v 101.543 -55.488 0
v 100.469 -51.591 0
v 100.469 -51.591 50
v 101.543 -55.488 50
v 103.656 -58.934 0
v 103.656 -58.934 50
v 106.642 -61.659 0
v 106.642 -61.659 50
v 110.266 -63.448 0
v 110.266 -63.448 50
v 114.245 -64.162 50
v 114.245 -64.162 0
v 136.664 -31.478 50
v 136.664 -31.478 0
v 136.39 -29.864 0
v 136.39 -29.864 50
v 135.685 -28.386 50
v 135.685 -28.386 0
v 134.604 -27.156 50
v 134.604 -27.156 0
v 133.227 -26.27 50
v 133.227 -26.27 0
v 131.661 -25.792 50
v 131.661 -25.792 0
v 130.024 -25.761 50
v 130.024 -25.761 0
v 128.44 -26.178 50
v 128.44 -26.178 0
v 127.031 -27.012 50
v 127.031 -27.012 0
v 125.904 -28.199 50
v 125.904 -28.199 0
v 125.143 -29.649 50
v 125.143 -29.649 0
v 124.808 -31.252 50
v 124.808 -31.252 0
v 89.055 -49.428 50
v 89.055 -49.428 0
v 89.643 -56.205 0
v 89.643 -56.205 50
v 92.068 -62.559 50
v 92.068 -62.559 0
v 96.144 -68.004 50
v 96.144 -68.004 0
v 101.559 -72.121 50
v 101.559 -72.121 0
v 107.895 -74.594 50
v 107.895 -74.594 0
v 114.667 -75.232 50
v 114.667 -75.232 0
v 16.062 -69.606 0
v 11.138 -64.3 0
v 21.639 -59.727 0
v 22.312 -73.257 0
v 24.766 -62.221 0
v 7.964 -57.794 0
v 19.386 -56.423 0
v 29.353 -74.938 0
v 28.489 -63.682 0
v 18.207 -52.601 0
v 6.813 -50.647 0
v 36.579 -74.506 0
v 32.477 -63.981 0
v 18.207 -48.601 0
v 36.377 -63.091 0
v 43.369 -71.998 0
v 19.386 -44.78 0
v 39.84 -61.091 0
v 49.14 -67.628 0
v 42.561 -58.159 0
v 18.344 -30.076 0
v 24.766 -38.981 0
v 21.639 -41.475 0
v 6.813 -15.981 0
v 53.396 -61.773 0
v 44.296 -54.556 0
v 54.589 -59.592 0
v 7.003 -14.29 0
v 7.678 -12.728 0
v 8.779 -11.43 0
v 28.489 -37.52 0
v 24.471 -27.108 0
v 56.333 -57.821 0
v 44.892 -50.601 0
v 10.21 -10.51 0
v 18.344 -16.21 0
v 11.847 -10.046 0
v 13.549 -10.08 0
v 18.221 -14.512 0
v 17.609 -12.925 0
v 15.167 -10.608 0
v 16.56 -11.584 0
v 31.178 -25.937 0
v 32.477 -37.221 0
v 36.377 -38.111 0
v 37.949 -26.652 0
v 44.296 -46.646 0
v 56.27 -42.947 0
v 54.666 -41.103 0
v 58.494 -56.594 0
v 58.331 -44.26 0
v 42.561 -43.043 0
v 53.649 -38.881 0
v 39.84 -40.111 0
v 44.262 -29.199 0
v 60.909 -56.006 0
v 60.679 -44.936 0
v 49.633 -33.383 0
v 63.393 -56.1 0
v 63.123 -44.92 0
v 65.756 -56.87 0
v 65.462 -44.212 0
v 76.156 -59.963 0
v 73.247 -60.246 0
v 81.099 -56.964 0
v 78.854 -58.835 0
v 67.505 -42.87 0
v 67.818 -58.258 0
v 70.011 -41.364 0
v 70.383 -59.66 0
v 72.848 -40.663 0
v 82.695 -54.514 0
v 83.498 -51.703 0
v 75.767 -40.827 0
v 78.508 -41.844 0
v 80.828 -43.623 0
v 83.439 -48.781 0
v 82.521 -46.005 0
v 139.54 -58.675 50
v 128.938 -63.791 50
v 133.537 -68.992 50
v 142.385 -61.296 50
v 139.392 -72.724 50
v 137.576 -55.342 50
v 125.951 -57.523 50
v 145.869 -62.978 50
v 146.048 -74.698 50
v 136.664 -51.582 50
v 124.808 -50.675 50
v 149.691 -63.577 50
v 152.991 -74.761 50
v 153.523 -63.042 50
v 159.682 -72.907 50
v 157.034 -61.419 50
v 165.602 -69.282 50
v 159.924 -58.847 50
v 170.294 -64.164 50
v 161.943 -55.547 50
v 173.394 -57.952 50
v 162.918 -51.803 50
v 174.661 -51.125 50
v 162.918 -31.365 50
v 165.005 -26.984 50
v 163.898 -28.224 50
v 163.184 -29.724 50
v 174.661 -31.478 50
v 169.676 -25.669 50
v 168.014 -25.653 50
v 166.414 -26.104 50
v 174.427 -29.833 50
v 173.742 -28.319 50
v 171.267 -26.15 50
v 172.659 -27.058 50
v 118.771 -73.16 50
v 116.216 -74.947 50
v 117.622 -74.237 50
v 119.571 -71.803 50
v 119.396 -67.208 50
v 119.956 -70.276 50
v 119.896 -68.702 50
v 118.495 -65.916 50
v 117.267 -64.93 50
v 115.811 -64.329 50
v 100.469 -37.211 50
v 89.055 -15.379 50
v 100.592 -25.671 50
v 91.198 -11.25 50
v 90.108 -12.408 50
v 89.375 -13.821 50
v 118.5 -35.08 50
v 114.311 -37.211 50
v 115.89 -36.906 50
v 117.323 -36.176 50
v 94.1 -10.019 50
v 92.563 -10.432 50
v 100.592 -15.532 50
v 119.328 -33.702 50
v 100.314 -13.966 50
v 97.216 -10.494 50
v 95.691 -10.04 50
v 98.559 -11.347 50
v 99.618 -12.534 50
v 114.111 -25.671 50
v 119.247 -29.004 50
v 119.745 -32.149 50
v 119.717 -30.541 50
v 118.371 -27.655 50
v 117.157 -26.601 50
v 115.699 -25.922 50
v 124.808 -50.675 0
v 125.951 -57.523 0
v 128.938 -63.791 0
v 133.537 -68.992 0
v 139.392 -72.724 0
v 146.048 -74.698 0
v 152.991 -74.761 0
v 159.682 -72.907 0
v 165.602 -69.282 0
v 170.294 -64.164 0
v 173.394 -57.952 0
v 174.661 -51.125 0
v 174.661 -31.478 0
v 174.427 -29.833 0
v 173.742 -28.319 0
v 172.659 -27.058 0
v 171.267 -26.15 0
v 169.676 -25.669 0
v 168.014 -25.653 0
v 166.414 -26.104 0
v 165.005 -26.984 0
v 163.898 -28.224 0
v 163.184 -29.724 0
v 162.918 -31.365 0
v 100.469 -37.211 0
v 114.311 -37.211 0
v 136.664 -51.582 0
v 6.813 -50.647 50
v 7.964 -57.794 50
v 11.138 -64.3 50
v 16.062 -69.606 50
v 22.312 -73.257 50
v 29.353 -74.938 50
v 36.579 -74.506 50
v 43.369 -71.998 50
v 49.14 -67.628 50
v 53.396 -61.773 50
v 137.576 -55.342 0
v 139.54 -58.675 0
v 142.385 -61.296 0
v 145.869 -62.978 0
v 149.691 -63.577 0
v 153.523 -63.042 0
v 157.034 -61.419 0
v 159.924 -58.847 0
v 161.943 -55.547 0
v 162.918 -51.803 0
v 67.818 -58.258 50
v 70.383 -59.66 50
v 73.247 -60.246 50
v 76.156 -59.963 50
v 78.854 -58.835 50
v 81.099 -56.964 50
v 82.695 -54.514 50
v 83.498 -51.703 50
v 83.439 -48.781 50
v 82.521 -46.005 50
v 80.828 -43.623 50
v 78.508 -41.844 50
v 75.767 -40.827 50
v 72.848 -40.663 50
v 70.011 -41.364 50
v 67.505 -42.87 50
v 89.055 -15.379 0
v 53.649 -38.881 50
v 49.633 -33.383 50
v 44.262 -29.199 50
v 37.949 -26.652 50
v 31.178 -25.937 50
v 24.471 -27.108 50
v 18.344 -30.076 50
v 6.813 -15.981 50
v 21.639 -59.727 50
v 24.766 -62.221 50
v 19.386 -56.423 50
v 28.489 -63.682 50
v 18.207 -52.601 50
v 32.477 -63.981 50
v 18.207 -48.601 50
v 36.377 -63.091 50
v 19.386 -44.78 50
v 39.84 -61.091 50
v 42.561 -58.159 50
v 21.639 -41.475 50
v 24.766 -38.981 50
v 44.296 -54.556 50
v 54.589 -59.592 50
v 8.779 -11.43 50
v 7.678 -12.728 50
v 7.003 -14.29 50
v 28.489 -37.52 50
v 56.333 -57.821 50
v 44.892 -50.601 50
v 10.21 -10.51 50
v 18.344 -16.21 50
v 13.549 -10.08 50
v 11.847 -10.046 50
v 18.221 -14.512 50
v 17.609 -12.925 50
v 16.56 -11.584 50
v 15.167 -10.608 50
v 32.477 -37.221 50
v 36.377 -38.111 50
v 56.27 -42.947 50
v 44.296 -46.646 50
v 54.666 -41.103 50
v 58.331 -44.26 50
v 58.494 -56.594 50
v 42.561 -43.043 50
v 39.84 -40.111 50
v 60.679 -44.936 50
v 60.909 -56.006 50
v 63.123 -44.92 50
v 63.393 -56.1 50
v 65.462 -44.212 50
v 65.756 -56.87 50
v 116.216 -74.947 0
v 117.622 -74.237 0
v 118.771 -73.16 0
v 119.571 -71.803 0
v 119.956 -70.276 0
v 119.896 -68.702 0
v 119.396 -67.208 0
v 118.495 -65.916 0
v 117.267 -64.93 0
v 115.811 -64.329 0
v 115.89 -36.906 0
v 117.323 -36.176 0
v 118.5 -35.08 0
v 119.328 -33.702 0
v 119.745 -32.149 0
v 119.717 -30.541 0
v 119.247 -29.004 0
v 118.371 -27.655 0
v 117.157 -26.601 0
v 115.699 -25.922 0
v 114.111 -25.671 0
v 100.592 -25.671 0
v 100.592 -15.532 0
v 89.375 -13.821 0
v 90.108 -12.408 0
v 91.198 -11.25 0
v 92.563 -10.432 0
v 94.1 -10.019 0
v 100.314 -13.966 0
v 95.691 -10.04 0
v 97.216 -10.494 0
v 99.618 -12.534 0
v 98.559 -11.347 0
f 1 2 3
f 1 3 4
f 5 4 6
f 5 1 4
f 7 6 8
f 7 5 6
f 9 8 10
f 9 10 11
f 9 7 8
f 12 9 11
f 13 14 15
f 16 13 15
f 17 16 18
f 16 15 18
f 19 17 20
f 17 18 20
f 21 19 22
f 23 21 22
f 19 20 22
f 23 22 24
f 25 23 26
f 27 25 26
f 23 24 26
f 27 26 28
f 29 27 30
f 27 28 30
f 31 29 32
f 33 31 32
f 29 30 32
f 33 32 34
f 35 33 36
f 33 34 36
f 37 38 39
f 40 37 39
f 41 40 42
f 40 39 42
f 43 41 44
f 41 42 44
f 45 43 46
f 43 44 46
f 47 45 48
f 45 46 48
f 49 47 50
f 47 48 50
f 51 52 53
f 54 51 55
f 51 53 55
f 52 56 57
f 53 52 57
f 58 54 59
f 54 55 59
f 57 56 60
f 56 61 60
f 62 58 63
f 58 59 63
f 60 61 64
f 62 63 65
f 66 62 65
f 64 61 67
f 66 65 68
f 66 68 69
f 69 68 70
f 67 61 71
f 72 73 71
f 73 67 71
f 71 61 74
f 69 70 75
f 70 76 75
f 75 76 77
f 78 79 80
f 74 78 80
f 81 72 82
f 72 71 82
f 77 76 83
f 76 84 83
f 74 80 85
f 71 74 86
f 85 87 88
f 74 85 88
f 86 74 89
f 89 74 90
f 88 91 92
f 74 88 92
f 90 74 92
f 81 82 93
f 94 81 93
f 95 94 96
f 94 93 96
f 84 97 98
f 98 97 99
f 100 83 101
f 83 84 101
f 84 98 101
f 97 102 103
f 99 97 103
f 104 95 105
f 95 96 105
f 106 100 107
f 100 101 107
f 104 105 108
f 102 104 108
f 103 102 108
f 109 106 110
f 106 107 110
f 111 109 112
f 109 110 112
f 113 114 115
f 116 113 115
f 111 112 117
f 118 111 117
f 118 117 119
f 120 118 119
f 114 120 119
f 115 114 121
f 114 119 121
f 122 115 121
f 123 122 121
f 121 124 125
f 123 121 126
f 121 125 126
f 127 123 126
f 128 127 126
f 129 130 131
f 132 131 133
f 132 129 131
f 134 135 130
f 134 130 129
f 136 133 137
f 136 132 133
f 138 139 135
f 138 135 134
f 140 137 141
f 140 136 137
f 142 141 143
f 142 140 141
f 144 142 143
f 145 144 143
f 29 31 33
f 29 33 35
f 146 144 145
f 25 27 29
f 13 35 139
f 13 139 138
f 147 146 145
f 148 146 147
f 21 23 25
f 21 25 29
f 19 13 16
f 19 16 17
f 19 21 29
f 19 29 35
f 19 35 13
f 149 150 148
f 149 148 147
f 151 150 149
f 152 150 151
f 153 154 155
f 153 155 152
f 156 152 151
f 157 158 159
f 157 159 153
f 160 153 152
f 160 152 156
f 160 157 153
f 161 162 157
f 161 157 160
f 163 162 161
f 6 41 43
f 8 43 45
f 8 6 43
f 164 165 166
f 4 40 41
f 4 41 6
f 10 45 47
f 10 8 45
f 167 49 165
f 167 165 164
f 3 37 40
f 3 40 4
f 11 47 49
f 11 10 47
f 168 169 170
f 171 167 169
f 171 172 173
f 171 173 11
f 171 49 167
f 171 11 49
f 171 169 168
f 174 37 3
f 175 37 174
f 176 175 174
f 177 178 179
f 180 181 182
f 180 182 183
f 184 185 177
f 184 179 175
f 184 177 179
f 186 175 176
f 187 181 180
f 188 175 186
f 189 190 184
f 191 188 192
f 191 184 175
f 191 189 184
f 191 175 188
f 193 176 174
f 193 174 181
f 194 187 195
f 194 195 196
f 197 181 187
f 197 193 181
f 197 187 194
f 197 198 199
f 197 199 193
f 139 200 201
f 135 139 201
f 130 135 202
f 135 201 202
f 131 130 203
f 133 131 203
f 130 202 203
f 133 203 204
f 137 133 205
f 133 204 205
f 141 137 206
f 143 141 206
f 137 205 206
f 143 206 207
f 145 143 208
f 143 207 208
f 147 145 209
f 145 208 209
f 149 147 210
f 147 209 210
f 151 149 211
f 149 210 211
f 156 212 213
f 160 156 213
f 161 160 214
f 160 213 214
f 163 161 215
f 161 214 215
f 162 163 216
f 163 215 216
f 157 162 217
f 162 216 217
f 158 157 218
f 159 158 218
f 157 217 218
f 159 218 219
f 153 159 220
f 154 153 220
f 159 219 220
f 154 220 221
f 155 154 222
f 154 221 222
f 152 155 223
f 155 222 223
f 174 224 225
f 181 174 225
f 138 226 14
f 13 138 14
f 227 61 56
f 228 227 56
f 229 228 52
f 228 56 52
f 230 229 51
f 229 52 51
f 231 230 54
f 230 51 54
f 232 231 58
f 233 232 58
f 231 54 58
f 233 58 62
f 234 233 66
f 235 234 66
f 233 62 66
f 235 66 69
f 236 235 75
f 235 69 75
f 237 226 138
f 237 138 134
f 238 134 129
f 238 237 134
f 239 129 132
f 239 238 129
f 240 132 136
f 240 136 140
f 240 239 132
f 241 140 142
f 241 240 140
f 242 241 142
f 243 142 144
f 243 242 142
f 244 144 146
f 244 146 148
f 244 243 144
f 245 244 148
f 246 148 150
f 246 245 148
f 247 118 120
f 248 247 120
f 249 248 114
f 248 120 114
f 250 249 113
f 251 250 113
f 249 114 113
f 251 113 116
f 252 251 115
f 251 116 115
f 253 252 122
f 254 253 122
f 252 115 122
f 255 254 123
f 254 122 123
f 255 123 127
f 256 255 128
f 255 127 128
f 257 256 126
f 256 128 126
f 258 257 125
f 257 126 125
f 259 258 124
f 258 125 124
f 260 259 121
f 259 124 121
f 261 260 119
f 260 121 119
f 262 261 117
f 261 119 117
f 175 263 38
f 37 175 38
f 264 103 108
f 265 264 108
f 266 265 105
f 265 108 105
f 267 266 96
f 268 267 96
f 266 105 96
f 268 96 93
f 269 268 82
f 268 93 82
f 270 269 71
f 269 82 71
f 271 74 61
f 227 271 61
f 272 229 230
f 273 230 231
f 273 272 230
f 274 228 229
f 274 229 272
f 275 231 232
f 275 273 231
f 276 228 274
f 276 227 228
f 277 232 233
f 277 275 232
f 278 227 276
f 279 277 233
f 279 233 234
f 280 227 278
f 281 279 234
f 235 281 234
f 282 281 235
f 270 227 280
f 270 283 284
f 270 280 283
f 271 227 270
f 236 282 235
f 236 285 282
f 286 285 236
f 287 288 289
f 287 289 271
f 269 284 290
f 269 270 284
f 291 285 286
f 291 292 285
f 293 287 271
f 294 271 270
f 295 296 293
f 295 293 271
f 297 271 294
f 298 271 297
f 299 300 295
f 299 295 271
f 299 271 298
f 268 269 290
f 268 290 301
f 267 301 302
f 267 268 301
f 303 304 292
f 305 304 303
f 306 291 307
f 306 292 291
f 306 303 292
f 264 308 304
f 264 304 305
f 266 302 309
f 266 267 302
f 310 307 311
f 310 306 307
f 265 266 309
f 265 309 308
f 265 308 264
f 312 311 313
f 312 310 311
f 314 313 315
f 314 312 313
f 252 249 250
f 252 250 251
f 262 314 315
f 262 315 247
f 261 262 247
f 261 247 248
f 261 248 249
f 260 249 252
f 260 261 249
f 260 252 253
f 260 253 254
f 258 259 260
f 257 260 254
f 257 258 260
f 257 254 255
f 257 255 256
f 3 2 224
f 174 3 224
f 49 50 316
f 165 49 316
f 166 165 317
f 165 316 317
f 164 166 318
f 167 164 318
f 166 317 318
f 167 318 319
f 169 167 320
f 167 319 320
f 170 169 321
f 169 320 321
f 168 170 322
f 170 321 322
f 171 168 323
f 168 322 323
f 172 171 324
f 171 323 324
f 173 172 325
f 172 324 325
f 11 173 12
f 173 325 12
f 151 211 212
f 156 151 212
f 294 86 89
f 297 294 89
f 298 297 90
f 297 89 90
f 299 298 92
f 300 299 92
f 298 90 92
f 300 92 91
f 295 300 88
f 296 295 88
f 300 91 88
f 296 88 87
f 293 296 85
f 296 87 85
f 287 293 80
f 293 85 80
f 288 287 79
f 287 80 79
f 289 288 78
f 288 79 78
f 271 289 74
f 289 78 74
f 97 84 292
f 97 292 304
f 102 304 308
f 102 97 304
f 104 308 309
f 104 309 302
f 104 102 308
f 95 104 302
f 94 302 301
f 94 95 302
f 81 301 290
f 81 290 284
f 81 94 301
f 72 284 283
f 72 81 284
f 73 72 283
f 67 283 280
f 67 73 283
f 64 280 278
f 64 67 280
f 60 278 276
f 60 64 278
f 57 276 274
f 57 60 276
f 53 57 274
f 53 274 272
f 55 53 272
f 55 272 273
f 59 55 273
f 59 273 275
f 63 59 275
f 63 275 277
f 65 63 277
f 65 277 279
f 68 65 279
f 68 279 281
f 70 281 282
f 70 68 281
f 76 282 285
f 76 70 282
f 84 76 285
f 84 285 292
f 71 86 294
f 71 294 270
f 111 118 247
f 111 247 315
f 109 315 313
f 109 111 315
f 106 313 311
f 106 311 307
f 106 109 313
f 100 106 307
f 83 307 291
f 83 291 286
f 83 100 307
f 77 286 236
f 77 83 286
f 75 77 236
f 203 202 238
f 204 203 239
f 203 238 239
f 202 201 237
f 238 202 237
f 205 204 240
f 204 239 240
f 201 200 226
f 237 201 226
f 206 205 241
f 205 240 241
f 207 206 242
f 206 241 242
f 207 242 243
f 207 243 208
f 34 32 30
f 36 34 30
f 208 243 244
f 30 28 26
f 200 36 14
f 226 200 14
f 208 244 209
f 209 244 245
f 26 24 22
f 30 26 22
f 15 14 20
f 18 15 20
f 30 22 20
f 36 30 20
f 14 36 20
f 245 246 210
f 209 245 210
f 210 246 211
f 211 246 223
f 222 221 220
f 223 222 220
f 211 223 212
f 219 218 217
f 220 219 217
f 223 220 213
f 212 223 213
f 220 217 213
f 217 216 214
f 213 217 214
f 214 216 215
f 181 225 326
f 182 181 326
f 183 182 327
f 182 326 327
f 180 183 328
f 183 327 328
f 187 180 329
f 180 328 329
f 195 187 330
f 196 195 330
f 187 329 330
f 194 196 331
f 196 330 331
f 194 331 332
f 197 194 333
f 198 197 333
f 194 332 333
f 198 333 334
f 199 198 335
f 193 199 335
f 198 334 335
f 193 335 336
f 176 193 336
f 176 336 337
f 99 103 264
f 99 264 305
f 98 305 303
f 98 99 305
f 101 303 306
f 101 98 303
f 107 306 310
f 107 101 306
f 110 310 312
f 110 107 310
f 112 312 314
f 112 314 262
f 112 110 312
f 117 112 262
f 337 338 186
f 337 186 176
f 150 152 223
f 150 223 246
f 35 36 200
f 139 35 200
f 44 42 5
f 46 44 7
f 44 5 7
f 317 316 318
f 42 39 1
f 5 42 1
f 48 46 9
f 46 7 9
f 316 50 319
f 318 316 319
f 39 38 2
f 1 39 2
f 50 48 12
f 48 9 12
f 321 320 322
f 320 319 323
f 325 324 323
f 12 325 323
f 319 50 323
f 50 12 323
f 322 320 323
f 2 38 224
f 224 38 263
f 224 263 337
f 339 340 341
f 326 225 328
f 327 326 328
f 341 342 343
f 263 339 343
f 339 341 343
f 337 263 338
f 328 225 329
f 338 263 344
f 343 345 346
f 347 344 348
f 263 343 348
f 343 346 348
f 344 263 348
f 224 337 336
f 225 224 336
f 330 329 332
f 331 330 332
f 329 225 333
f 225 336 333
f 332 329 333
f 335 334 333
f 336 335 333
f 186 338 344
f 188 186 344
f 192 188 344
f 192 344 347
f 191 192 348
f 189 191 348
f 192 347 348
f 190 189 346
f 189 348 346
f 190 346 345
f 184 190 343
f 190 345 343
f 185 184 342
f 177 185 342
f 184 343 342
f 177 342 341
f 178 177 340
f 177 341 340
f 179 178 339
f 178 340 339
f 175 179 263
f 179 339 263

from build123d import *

# Parameters (mm, degrees)
SKETCH003_R = 13.417184
PAD_DEPTH   = 50


with BuildPart() as part:
    # Sketch003 → Pad (new body)
    with BuildSketch(Plane.XY):
        with BuildLine():
            ThreePointArc((100.592001, -15.532155), (94.896046, -9.973995), (89.054965, -15.379439))
            Line((89.054965, -15.379439), (89.054965, -49.428334))
            ThreePointArc((89.054965, -49.428334), (96.144439, -68.004268), (114.666978, -75.232099))
            ThreePointArc((114.666978, -75.232099), (119.982403, -69.486443), (114.244811, -64.162315))
            ThreePointArc((100.468937, -51.591315), (105.053235, -60.401247), (114.244811, -64.162315))
            Line((100.468937, -51.591315), (100.468937, -37.211213))
            Line((100.468937, -37.211213), (114.311441, -37.211213))
            ThreePointArc((114.311441, -37.211213), (119.787219, -31.344318), (114.111035, -25.671088))
            Line((114.111035, -25.671088), (100.592001, -25.671088))
            Line((100.592001, -15.532155), (100.592001, -25.671088))
        make_face()
        with BuildLine():
            ThreePointArc((18.34428, -16.209642), (12.699439, -9.999822), (6.813309, -15.981424))
            Line((6.813309, -15.981424), (6.813309, -50.647022))
            ThreePointArc((6.813309, -50.647022), (25.77067, -74.356694), (53.396399, -61.773008))
            ThreePointArc((67.818269, -58.257543), (59.681248, -56.216093), (53.396399, -61.773008))
            ThreePointArc((67.818269, -58.257543), (83.577804, -50.239906), (67.505024, -42.870294))
            ThreePointArc((53.649257, -38.880599), (59.480837, -44.682785), (67.505024, -42.870294))
            ThreePointArc((53.649257, -38.880599), (37.94851, -26.652001), (18.34428, -30.076362))
            Line((18.34428, -16.209642), (18.34428, -30.076362))
        make_face()
        with Locations((31.474753, -50.60106)):
            Circle(SKETCH003_R, mode=Mode.SUBTRACT)
        with BuildLine():
            ThreePointArc((136.664074, -31.477958), (130.843407, -25.719992), (124.807694, -31.252127))
            Line((124.807694, -31.252127), (124.807694, -50.675155))
            ThreePointArc((124.807694, -50.675155), (149.517148, -74.97216), (174.661347, -51.12534))
            Line((174.661347, -51.12534), (174.661347, -31.477956))
            ThreePointArc((174.661347, -31.477956), (168.845675, -25.602232), (162.918091, -31.365036))
            Line((162.918091, -31.365036), (162.918091, -51.802822))
            ThreePointArc((136.664074, -51.582098), (149.691163, -63.577373), (162.918091, -51.802822))
            Line((136.664074, -51.582098), (136.664074, -31.477958))
        make_face()
    extrude(amount=PAD_DEPTH)


solid = part.part
